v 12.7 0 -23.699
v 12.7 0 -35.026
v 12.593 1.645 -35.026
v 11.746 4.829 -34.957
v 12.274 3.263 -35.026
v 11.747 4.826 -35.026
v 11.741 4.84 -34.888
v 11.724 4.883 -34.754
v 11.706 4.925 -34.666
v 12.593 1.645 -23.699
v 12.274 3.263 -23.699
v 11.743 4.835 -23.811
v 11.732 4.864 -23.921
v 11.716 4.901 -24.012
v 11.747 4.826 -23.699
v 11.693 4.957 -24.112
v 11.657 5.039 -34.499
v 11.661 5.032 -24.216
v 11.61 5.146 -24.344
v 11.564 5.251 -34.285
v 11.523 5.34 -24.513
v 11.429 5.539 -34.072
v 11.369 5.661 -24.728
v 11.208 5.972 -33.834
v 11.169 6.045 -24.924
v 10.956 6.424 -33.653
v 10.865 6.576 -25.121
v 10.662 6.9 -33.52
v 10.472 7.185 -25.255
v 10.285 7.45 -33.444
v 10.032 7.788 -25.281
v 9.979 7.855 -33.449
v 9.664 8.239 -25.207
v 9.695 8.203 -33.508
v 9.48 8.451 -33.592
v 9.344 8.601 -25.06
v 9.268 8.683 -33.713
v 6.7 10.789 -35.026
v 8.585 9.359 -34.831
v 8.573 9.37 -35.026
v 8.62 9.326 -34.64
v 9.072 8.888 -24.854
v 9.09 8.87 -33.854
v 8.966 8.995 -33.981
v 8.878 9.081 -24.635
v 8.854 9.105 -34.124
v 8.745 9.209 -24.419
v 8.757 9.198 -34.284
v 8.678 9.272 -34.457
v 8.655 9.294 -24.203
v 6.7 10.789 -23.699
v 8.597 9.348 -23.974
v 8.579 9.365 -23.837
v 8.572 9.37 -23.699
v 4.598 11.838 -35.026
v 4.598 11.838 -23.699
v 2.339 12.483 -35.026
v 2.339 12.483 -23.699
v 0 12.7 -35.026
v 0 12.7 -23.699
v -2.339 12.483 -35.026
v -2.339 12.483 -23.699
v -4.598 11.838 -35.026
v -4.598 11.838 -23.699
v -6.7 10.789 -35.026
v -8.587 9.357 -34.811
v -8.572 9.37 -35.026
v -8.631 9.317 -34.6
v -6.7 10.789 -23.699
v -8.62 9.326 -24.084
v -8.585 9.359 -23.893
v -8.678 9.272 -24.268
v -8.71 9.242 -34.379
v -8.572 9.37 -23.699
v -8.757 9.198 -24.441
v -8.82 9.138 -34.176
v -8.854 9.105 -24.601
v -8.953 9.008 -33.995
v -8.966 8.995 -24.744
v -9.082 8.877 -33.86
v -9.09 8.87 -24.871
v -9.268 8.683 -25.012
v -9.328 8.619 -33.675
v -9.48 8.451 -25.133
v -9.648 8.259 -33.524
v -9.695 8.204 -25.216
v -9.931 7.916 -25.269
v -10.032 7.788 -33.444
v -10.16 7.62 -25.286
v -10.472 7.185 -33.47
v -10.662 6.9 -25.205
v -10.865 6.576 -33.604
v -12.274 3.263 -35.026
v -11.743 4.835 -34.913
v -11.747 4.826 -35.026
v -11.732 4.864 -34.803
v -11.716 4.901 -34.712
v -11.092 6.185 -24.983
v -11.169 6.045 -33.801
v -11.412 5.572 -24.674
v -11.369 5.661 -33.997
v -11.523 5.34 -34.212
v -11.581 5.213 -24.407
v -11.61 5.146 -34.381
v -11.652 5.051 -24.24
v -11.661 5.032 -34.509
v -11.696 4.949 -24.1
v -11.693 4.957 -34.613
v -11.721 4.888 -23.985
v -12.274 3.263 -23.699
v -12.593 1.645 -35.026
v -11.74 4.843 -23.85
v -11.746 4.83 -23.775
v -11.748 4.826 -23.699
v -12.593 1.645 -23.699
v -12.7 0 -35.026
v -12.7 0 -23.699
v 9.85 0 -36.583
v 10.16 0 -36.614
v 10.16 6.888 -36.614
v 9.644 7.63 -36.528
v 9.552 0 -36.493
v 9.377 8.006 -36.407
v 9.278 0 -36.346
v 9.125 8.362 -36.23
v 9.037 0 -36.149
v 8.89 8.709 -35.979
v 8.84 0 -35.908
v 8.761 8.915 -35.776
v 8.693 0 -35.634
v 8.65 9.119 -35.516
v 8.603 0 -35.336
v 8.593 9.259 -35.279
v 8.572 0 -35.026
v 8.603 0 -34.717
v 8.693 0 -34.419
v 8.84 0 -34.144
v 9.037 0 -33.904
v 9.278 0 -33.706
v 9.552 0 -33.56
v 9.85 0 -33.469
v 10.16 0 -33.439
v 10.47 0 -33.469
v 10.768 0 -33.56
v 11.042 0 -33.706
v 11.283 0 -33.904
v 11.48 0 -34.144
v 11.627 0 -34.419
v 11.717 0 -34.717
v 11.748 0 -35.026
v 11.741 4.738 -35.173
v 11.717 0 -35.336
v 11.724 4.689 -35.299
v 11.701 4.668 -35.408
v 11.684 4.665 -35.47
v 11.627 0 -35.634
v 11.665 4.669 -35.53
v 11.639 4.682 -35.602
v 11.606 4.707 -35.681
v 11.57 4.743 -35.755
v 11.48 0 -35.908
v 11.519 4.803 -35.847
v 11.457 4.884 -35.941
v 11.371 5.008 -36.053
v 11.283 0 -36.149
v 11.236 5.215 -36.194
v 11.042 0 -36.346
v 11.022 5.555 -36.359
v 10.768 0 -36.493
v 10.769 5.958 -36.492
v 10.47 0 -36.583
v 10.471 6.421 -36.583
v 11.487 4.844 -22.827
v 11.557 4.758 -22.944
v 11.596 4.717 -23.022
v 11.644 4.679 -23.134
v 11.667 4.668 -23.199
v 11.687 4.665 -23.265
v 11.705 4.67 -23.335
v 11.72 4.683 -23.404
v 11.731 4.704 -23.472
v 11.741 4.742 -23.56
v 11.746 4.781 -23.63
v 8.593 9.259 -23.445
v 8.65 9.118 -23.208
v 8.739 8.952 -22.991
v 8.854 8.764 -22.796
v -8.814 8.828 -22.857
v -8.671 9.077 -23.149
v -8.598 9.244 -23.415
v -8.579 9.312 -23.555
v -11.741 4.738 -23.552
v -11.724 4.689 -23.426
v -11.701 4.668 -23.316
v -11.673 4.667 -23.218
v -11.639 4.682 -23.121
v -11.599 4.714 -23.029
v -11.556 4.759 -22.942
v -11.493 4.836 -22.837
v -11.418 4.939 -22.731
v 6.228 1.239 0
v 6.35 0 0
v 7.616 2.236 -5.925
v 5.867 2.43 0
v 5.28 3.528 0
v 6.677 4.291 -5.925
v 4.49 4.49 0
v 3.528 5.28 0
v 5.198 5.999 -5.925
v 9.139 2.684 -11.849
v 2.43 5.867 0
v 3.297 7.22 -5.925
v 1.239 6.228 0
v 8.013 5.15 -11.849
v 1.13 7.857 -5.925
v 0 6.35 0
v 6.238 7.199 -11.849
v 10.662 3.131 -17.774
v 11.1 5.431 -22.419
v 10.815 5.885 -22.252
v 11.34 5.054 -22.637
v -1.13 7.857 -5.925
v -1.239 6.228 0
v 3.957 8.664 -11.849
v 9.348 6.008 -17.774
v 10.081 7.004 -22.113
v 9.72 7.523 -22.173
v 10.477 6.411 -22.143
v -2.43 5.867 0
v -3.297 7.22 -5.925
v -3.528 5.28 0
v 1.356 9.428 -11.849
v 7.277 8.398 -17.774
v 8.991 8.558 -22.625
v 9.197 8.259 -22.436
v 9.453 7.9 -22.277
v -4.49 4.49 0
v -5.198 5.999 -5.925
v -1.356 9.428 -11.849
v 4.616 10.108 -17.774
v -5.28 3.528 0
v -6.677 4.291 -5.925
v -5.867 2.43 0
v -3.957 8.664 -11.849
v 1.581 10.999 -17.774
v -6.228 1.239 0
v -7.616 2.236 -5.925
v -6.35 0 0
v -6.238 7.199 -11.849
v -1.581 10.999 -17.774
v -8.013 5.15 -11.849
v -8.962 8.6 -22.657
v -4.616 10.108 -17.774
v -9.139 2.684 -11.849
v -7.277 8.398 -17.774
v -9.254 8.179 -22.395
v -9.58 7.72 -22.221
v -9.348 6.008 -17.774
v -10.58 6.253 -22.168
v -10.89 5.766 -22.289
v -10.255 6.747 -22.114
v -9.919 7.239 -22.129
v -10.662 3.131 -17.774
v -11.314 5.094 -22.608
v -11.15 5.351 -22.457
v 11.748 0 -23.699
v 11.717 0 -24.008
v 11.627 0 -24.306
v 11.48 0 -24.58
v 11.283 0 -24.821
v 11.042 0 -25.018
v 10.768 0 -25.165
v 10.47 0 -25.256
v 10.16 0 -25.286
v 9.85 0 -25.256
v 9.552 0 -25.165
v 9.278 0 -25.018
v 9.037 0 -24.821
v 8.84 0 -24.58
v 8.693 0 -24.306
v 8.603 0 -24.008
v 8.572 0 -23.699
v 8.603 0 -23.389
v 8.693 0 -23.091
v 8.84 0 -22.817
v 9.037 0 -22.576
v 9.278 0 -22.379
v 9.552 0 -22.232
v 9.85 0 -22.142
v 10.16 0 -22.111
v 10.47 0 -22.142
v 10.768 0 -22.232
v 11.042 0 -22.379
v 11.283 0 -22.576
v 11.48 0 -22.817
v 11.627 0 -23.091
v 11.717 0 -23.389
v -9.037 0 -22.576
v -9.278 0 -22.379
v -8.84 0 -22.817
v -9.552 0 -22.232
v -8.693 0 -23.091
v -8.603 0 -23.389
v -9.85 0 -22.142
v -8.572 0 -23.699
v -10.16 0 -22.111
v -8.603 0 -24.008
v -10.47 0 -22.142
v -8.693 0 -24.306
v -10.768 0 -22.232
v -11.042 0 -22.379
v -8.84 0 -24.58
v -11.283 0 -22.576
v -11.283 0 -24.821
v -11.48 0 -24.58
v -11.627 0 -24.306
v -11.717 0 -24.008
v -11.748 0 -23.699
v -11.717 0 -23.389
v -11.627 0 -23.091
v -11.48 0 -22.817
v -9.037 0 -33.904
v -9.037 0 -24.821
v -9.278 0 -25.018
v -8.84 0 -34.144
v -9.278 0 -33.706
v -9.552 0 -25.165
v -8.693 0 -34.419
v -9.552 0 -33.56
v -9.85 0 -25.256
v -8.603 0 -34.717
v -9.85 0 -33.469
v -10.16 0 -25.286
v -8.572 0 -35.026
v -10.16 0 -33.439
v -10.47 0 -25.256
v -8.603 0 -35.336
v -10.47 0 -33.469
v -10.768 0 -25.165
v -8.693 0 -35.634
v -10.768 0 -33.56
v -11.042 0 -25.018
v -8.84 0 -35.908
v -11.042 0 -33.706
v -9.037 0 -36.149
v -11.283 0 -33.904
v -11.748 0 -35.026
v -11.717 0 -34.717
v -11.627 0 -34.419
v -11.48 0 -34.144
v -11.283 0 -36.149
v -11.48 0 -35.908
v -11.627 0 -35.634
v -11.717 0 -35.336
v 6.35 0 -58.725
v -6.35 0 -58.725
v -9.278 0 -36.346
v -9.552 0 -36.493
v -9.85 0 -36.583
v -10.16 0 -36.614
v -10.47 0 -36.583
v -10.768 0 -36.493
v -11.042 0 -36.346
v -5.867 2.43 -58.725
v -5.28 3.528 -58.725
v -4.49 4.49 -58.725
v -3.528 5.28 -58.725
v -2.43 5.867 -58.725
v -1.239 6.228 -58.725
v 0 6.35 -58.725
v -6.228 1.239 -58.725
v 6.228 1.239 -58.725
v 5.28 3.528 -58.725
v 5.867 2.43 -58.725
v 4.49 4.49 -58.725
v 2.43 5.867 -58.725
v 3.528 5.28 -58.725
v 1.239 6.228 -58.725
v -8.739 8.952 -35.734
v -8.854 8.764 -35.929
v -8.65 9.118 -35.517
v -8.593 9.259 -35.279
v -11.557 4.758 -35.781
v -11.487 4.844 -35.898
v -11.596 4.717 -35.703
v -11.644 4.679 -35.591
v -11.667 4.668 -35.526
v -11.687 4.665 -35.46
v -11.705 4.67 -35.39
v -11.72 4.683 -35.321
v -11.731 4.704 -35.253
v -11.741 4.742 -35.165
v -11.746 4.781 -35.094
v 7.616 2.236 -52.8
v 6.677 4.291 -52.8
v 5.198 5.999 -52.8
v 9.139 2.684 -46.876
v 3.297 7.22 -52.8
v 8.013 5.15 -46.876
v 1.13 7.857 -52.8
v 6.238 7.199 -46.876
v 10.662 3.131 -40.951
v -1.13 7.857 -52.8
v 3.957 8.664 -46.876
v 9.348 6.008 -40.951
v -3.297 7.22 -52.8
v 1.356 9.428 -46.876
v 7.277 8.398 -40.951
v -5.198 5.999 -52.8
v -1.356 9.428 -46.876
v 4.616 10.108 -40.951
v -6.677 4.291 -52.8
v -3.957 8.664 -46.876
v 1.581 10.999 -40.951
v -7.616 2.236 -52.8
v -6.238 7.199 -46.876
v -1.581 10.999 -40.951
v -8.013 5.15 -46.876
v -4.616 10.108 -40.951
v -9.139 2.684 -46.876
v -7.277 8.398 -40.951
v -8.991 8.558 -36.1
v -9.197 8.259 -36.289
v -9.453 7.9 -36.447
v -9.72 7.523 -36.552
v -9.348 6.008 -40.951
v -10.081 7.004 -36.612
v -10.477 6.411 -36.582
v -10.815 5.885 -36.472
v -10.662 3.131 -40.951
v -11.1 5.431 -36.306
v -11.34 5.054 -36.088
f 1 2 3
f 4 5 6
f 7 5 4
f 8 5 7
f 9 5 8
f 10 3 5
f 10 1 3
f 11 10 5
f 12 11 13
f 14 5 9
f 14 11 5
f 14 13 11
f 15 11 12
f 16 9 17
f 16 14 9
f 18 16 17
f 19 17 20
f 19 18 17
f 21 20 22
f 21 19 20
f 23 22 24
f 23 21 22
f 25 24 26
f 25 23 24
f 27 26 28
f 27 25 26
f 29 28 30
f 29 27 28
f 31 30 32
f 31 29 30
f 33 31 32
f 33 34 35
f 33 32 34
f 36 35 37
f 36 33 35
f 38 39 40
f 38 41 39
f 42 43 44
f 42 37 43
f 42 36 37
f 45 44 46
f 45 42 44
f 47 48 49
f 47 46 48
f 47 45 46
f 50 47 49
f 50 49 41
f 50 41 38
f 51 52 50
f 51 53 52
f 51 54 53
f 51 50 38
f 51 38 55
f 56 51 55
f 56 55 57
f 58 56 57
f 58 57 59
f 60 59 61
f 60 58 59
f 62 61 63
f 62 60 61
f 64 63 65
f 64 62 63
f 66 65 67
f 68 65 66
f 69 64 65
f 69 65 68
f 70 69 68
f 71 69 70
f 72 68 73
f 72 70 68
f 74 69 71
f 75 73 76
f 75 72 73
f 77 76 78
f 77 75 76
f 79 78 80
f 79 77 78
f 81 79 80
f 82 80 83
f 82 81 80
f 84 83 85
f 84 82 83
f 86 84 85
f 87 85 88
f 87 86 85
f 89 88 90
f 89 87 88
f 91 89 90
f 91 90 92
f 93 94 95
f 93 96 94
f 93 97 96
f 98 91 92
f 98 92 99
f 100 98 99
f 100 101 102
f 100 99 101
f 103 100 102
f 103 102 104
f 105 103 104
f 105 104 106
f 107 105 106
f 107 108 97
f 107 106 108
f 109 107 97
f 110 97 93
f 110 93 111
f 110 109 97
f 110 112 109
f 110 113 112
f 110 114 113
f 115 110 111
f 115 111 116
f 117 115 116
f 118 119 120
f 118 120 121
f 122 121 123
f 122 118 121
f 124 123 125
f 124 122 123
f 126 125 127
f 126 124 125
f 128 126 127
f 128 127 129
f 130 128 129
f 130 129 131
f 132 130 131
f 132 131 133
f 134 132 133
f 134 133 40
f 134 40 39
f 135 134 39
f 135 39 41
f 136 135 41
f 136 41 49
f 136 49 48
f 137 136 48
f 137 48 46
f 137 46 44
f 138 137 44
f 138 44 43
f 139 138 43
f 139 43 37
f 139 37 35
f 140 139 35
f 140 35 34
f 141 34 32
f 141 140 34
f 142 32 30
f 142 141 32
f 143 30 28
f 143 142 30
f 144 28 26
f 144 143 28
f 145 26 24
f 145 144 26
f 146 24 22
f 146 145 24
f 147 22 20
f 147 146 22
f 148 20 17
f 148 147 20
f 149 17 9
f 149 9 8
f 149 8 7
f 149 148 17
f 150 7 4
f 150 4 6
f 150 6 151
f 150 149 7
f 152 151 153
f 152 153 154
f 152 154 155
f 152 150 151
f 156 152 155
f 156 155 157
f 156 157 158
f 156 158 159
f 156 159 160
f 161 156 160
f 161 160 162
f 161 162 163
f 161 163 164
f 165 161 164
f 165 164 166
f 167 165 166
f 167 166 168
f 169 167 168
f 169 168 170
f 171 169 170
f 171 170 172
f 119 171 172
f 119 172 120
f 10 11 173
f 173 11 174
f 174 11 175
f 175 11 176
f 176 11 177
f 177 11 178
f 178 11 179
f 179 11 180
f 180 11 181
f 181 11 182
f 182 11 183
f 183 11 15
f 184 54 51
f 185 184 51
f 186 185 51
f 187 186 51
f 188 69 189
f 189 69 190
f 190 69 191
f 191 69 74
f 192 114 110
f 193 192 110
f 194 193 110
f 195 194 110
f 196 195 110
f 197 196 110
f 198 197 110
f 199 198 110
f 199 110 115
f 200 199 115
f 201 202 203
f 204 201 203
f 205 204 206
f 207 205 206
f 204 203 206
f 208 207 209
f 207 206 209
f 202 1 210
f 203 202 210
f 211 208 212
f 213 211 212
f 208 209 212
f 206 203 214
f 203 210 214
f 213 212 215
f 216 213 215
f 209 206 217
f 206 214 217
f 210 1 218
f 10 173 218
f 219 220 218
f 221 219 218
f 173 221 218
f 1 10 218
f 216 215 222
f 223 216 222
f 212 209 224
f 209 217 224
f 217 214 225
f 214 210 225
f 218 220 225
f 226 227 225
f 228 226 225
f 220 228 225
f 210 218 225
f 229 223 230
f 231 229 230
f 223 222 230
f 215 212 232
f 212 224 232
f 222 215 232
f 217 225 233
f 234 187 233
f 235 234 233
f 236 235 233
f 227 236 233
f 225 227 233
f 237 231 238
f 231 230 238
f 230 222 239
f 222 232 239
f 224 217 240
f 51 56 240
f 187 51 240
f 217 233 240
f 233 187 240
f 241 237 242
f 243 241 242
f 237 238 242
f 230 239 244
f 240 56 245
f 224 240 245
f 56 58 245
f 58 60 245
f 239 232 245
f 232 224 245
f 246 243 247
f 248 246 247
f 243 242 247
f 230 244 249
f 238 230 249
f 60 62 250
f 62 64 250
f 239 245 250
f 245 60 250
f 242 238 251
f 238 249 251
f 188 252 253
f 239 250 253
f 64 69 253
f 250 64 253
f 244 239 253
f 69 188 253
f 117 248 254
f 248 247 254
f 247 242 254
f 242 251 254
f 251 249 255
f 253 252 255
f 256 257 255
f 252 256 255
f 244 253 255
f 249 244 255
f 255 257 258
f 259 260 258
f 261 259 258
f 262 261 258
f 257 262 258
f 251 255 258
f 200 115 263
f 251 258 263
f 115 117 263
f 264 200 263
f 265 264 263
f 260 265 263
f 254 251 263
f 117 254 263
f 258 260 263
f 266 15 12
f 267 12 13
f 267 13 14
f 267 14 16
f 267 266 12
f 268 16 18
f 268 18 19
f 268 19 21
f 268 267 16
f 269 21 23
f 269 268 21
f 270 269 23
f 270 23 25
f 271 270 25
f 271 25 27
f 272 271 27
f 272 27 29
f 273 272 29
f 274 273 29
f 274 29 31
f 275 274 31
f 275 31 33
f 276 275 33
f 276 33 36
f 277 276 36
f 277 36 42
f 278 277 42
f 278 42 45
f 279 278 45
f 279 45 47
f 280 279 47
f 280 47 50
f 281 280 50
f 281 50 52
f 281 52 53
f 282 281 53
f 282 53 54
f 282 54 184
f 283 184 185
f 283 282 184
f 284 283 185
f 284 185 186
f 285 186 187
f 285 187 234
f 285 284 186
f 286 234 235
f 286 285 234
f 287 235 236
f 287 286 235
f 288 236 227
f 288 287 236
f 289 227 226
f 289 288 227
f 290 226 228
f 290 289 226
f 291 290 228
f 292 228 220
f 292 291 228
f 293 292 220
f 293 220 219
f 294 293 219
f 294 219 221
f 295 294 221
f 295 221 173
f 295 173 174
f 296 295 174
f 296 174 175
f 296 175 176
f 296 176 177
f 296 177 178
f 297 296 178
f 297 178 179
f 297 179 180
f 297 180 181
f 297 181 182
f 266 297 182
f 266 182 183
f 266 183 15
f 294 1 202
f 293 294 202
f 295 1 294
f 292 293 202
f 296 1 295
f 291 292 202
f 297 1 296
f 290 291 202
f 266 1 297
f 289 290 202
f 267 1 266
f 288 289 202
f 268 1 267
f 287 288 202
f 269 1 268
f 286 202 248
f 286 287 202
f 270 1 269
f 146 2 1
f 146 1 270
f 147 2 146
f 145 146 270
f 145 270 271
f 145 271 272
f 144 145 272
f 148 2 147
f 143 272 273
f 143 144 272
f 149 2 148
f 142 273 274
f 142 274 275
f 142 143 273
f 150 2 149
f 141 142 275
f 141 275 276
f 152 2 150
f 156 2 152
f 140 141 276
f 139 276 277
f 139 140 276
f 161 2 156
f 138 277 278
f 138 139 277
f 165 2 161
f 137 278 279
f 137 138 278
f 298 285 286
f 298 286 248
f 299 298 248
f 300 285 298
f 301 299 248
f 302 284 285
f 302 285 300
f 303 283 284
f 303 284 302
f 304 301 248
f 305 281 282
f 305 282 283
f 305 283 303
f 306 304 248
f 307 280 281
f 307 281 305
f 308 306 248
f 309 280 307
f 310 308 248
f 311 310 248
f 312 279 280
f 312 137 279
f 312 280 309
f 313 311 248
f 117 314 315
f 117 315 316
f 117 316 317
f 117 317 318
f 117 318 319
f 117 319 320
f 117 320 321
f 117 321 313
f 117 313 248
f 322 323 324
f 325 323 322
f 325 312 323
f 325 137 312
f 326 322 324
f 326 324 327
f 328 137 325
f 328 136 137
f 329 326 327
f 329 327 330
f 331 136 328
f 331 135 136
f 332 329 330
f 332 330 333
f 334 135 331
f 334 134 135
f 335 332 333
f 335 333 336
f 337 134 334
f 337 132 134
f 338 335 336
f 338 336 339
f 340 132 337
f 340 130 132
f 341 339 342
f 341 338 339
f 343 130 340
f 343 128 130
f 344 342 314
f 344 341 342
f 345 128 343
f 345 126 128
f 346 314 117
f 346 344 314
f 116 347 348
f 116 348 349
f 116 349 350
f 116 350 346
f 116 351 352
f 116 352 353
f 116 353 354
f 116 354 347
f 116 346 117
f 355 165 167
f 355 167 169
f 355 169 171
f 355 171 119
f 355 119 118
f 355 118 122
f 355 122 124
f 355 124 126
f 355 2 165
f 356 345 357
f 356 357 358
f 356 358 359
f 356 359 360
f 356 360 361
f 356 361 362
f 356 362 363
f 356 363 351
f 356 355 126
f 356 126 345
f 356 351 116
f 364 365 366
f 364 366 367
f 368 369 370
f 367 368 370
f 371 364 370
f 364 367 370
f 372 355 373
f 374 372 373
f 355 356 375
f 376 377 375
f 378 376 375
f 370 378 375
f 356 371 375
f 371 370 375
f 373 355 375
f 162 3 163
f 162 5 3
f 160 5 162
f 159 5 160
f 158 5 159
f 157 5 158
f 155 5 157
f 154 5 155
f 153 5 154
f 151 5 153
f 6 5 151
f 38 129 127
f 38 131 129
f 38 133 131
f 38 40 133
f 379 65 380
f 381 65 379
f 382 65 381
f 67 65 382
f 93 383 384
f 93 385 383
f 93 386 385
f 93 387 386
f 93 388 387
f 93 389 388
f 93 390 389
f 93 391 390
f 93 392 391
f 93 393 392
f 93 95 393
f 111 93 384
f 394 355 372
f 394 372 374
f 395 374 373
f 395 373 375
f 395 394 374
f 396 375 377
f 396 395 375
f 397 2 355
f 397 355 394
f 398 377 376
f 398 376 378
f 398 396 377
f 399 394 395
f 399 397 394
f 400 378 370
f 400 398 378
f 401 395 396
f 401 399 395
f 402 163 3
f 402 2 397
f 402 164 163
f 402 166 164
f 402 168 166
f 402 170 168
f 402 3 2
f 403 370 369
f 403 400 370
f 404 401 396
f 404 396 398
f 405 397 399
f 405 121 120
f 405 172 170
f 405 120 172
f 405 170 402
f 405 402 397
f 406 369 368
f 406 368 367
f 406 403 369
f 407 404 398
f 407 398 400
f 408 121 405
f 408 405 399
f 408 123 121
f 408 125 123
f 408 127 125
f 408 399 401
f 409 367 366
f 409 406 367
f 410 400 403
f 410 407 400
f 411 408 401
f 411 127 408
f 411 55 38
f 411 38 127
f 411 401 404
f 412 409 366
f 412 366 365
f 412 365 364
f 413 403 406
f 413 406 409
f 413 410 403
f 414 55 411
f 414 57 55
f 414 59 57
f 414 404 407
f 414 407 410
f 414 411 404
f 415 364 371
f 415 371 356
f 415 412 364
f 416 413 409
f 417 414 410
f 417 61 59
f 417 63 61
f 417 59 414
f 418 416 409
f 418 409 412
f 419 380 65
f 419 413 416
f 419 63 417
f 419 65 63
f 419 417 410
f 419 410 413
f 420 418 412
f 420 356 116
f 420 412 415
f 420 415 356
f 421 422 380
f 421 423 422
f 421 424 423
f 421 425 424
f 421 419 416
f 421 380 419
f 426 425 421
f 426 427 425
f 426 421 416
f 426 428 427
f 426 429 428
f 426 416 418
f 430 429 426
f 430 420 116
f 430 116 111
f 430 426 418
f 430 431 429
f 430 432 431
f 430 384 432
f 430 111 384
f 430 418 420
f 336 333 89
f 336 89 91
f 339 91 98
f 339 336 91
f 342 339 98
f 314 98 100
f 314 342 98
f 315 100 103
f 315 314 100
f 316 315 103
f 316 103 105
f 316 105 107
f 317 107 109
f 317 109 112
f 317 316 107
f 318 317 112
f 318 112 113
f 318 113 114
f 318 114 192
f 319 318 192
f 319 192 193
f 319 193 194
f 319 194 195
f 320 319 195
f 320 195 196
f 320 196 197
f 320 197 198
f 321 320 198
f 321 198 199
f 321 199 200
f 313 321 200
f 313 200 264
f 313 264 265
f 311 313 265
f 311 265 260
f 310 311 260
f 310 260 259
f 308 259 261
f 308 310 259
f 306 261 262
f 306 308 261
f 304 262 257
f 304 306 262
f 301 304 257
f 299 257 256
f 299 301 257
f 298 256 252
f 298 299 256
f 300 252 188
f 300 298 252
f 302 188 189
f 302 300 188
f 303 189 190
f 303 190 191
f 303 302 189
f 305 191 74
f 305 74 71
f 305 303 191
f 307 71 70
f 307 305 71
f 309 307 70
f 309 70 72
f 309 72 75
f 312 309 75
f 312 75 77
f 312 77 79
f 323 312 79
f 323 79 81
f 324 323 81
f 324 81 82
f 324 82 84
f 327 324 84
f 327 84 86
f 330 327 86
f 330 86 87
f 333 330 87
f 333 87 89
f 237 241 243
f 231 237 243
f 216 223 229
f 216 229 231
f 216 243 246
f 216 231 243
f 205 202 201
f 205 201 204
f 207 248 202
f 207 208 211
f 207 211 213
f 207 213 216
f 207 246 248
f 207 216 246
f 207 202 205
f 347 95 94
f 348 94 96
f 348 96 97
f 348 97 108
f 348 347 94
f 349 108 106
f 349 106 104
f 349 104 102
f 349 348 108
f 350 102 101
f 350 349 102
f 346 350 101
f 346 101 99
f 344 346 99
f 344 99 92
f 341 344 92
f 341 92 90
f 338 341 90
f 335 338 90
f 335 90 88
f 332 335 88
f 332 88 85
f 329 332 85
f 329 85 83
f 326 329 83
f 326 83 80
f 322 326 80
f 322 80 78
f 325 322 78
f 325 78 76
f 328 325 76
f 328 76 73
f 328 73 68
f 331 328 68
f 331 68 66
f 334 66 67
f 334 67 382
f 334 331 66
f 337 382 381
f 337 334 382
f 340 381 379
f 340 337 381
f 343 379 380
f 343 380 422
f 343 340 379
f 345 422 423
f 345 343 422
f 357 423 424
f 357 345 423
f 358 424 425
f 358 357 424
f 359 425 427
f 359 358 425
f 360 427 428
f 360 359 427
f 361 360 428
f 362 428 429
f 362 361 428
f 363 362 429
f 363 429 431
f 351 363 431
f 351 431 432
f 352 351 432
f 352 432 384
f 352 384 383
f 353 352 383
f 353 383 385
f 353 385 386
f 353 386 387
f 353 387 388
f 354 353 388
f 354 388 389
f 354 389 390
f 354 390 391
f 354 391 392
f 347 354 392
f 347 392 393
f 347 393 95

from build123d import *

# Parameters (mm, degrees)
SKETCH1_R           = 12.7
BOSS_EXTRUDE1_DEPTH = 58.7248
CHAMFER3_SIZE       = 6.35
CHAMFER3_SIZE2      = 23.698522628
CHAMFER4_SIZE       = 6.35
CHAMFER4_SIZE2      = 23.698522628
CUT_EXTRUDE1_DEPTH  = 58.7248
SKETCH3_R           = 1.5875
CUT_EXTRUDE2_DEPTH  = 62.409951433


with BuildPart() as part:
    # Sketch1 → Boss-Extrude1 (new body)
    with BuildSketch(Plane.XY):
        Circle(SKETCH1_R)
    extrude(amount=-BOSS_EXTRUDE1_DEPTH)

    # Chamfer3
    chamfer3_edges = [part.edges().sort_by_distance(p)[0] for p in [
        (-12.7, 0, -58.7248),
    ]]
    chamfer3_side = [part.faces().sort_by_distance(p)[0] for p in [
        (0, 0, -58.7248),
    ]]
    chamfer(chamfer3_edges, length=CHAMFER3_SIZE, length2=CHAMFER3_SIZE2, reference=chamfer3_side[0])

    # Chamfer4
    chamfer4_edges = [part.edges().sort_by_distance(p)[0] for p in [
        (-12.7, 0, 0),
    ]]
    chamfer4_side = [part.faces().sort_by_distance(p)[0] for p in [
        (0, 0, 0),
    ]]
    chamfer(chamfer4_edges, length=CHAMFER4_SIZE, length2=CHAMFER4_SIZE2, reference=chamfer4_side[0])

    # Sketch2 → Cut-Extrude1 (cut)
    with BuildSketch(Plane(origin=(0, 0, 0), x_dir=(1, 0, 0), z_dir=(0, 1, 0))):
        Polygon((-6.35, 0), (-12.7, 23.698522628), (-12.7, 35.026277372), (-6.35, 58.7248), (6.35, 58.7248), (12.7, 35.026277372), (12.7, 23.698522628), (6.35, 0), align=None)
    extrude(amount=-CUT_EXTRUDE1_DEPTH, mode=Mode.SUBTRACT)

    # Sketch3 → Cut-Extrude2 (cut, through all)
    with BuildSketch(Plane(origin=(0, 0, 0), x_dir=(1, 0, 0), z_dir=(0, 1, 0))):
        with Locations(Location((-10.16, 35.026277372, 0), (0, 0, 179.999999983))):
            Circle(SKETCH3_R)
        with Locations(Location((10.16, 35.026277372, 0), (0, 0, 90))):
            Circle(SKETCH3_R)
        with Locations((10.16, 23.698522628)):
            Circle(SKETCH3_R)
        with Locations(Location((-10.16, 23.698522628, 0), (0, 0, 90))):
            Circle(SKETCH3_R)
    extrude(amount=CUT_EXTRUDE2_DEPTH, mode=Mode.SUBTRACT)


solid = part.part
